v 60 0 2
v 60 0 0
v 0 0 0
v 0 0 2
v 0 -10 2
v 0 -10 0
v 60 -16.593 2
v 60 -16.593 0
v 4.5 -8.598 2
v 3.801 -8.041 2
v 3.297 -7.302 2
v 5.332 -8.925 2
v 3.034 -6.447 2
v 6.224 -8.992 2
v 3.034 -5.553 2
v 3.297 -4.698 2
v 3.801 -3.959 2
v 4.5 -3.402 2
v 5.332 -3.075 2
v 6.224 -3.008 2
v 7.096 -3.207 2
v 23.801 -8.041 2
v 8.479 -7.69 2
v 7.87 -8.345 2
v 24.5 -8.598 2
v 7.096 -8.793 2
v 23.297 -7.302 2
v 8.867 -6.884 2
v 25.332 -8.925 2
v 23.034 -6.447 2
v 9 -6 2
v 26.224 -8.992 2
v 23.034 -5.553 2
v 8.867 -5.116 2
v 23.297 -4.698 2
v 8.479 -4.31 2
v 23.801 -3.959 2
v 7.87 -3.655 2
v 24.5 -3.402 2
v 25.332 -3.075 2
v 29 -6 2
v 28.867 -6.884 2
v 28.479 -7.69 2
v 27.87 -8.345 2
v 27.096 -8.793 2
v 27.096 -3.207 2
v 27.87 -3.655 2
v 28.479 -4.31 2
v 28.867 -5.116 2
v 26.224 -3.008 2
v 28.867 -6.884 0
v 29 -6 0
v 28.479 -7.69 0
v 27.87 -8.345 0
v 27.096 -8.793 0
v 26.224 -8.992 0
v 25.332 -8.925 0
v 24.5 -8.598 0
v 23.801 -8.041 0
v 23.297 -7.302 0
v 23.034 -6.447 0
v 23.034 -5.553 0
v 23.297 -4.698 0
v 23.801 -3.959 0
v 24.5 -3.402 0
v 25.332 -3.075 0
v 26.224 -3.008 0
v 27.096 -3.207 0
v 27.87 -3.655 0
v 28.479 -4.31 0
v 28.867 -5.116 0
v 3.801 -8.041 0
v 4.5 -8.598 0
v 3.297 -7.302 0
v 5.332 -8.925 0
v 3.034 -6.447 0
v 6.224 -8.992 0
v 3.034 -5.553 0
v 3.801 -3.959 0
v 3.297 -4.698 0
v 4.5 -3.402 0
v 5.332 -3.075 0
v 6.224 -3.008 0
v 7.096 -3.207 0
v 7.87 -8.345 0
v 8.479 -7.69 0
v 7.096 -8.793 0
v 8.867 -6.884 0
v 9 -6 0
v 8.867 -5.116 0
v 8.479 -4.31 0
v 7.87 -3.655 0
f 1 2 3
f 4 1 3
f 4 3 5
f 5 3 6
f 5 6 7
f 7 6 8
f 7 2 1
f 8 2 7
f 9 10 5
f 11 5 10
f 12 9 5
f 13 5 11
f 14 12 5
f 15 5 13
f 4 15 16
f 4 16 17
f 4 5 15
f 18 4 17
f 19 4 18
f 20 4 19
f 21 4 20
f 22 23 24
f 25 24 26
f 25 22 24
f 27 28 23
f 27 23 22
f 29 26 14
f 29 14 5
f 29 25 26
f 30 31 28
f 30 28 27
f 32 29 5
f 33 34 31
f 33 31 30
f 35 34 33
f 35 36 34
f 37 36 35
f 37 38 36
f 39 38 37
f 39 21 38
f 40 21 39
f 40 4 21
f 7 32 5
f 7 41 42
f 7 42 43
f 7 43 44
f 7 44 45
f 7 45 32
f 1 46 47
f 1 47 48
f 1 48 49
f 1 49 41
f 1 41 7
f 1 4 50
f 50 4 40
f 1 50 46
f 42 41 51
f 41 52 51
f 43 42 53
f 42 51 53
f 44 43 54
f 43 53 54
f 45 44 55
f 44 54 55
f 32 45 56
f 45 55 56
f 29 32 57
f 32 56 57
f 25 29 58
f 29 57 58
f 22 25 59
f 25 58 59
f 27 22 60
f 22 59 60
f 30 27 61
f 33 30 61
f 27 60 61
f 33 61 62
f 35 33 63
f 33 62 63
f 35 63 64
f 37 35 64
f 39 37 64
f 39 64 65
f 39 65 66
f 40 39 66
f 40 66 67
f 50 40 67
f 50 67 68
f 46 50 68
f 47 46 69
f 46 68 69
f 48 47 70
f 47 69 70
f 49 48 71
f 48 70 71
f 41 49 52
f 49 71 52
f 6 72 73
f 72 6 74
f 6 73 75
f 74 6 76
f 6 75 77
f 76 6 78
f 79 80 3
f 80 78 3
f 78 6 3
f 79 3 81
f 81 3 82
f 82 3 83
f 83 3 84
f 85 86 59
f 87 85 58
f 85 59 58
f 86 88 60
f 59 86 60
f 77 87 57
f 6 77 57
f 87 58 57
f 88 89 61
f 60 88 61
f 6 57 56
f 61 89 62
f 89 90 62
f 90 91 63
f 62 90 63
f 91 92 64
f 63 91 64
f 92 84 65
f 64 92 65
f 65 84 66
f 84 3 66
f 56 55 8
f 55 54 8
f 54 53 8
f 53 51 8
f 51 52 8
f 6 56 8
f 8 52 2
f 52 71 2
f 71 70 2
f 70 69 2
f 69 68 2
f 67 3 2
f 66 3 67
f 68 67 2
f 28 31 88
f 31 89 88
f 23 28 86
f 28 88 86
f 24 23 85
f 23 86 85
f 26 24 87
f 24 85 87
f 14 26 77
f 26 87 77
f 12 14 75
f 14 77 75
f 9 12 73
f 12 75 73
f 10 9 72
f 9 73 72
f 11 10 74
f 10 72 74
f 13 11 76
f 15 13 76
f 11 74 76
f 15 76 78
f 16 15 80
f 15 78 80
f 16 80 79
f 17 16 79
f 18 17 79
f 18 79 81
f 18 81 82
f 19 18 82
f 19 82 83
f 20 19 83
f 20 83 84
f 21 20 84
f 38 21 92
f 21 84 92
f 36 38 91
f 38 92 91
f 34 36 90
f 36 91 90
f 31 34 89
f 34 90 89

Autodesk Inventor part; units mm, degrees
ref_plane "YZ Plane" through (0, 0, 0) normal (1, 0, 0) x (0, 1, 0)
ref_plane "XZ Plane" through (0, 0, 0) normal (0, 1, 0) x (-1, 0, 0)
ref_plane "XY Plane" through (0, 0, 0) normal (0, 0, 1) x (1, 0, 0)
sketch "Sketch1" plane through (0, 0, 0) normal (0, 0, 1) x (1, 0, 0)
  line L0 (60, 0) -> (60, -16.5934)
  line L1 (60, 0) -> (0, 0)
  line L2 (0, 0) -> (0, -10)
  line L3 (0, -10) -> (60, -16.5934)
  dimension "d43" = 10
  dimension "d44" = 60
  dimension "d51" = 6.271
extrude "Plate1" add sketch "Sketch1" along normal blind 2
sketch "Sketch6" plane through (0, 0, 0) normal (0, 0, 1) x (1, 0, 0)
  line L0 (0, -10) -> (60, -16.5934) projected
  line L1 (0, 0) -> (0, -10) projected
  line L2 (60, 0) -> (0, 0) projected
  line L3 (60, -16.5934) -> (60, 0) projected
  circle A0 centre (6, -6) radius 3
  circle A1 centre (26, -6) radius 3
  dimension "d45" = 6
  dimension "d46" = 6
  dimension "d47" = 6
  dimension "d48" = 20
sketch "Sketch2" plane through (0, 0, 0) normal (0, 0, -1) x (-1, 0, 0)
  line L0 (-179.9406, -4.4713) -> (20.0594, -4.4713) construction
  line L1 (20.0594, -4.4713) -> (20.0594, -24.4713) construction
  line L2 (20.0594, -24.4713) -> (-179.9406, -24.4713) construction
  line L3 (-179.9406, -24.4713) -> (-179.9406, -4.4713) construction
  point P0 (0, 0)
  point P1 (-251, -525)
  dimension "d6" = 200
  dimension "d9" = 20
mark "Mark1"
extrude "Extrusion1" cut sketch "Sketch6" along normal through all contours A0 | A1
equation "\"d2\" = Thickness"
equation "\"BendReliefWidth\" = Thickness"
equation "\"BendReliefDepth\" = 0.5 * Thickness"
equation "\"CornerReliefSize\" = 4 * Thickness"
equation "\"MinimumRemnant\" = 2 * Thickness"
equation "\"TransitionRadius\" = BendRadius"
equation "\"JacobiRadiusSize\" = BendRadius"
equation "\"GapSize\" = Thickness"
equation "\"Thickness\" = 2"
equation "\"BendRadius\" = 2.75"
properties part number "TRM 030 star conrtforce plate" material "AISI 304"
